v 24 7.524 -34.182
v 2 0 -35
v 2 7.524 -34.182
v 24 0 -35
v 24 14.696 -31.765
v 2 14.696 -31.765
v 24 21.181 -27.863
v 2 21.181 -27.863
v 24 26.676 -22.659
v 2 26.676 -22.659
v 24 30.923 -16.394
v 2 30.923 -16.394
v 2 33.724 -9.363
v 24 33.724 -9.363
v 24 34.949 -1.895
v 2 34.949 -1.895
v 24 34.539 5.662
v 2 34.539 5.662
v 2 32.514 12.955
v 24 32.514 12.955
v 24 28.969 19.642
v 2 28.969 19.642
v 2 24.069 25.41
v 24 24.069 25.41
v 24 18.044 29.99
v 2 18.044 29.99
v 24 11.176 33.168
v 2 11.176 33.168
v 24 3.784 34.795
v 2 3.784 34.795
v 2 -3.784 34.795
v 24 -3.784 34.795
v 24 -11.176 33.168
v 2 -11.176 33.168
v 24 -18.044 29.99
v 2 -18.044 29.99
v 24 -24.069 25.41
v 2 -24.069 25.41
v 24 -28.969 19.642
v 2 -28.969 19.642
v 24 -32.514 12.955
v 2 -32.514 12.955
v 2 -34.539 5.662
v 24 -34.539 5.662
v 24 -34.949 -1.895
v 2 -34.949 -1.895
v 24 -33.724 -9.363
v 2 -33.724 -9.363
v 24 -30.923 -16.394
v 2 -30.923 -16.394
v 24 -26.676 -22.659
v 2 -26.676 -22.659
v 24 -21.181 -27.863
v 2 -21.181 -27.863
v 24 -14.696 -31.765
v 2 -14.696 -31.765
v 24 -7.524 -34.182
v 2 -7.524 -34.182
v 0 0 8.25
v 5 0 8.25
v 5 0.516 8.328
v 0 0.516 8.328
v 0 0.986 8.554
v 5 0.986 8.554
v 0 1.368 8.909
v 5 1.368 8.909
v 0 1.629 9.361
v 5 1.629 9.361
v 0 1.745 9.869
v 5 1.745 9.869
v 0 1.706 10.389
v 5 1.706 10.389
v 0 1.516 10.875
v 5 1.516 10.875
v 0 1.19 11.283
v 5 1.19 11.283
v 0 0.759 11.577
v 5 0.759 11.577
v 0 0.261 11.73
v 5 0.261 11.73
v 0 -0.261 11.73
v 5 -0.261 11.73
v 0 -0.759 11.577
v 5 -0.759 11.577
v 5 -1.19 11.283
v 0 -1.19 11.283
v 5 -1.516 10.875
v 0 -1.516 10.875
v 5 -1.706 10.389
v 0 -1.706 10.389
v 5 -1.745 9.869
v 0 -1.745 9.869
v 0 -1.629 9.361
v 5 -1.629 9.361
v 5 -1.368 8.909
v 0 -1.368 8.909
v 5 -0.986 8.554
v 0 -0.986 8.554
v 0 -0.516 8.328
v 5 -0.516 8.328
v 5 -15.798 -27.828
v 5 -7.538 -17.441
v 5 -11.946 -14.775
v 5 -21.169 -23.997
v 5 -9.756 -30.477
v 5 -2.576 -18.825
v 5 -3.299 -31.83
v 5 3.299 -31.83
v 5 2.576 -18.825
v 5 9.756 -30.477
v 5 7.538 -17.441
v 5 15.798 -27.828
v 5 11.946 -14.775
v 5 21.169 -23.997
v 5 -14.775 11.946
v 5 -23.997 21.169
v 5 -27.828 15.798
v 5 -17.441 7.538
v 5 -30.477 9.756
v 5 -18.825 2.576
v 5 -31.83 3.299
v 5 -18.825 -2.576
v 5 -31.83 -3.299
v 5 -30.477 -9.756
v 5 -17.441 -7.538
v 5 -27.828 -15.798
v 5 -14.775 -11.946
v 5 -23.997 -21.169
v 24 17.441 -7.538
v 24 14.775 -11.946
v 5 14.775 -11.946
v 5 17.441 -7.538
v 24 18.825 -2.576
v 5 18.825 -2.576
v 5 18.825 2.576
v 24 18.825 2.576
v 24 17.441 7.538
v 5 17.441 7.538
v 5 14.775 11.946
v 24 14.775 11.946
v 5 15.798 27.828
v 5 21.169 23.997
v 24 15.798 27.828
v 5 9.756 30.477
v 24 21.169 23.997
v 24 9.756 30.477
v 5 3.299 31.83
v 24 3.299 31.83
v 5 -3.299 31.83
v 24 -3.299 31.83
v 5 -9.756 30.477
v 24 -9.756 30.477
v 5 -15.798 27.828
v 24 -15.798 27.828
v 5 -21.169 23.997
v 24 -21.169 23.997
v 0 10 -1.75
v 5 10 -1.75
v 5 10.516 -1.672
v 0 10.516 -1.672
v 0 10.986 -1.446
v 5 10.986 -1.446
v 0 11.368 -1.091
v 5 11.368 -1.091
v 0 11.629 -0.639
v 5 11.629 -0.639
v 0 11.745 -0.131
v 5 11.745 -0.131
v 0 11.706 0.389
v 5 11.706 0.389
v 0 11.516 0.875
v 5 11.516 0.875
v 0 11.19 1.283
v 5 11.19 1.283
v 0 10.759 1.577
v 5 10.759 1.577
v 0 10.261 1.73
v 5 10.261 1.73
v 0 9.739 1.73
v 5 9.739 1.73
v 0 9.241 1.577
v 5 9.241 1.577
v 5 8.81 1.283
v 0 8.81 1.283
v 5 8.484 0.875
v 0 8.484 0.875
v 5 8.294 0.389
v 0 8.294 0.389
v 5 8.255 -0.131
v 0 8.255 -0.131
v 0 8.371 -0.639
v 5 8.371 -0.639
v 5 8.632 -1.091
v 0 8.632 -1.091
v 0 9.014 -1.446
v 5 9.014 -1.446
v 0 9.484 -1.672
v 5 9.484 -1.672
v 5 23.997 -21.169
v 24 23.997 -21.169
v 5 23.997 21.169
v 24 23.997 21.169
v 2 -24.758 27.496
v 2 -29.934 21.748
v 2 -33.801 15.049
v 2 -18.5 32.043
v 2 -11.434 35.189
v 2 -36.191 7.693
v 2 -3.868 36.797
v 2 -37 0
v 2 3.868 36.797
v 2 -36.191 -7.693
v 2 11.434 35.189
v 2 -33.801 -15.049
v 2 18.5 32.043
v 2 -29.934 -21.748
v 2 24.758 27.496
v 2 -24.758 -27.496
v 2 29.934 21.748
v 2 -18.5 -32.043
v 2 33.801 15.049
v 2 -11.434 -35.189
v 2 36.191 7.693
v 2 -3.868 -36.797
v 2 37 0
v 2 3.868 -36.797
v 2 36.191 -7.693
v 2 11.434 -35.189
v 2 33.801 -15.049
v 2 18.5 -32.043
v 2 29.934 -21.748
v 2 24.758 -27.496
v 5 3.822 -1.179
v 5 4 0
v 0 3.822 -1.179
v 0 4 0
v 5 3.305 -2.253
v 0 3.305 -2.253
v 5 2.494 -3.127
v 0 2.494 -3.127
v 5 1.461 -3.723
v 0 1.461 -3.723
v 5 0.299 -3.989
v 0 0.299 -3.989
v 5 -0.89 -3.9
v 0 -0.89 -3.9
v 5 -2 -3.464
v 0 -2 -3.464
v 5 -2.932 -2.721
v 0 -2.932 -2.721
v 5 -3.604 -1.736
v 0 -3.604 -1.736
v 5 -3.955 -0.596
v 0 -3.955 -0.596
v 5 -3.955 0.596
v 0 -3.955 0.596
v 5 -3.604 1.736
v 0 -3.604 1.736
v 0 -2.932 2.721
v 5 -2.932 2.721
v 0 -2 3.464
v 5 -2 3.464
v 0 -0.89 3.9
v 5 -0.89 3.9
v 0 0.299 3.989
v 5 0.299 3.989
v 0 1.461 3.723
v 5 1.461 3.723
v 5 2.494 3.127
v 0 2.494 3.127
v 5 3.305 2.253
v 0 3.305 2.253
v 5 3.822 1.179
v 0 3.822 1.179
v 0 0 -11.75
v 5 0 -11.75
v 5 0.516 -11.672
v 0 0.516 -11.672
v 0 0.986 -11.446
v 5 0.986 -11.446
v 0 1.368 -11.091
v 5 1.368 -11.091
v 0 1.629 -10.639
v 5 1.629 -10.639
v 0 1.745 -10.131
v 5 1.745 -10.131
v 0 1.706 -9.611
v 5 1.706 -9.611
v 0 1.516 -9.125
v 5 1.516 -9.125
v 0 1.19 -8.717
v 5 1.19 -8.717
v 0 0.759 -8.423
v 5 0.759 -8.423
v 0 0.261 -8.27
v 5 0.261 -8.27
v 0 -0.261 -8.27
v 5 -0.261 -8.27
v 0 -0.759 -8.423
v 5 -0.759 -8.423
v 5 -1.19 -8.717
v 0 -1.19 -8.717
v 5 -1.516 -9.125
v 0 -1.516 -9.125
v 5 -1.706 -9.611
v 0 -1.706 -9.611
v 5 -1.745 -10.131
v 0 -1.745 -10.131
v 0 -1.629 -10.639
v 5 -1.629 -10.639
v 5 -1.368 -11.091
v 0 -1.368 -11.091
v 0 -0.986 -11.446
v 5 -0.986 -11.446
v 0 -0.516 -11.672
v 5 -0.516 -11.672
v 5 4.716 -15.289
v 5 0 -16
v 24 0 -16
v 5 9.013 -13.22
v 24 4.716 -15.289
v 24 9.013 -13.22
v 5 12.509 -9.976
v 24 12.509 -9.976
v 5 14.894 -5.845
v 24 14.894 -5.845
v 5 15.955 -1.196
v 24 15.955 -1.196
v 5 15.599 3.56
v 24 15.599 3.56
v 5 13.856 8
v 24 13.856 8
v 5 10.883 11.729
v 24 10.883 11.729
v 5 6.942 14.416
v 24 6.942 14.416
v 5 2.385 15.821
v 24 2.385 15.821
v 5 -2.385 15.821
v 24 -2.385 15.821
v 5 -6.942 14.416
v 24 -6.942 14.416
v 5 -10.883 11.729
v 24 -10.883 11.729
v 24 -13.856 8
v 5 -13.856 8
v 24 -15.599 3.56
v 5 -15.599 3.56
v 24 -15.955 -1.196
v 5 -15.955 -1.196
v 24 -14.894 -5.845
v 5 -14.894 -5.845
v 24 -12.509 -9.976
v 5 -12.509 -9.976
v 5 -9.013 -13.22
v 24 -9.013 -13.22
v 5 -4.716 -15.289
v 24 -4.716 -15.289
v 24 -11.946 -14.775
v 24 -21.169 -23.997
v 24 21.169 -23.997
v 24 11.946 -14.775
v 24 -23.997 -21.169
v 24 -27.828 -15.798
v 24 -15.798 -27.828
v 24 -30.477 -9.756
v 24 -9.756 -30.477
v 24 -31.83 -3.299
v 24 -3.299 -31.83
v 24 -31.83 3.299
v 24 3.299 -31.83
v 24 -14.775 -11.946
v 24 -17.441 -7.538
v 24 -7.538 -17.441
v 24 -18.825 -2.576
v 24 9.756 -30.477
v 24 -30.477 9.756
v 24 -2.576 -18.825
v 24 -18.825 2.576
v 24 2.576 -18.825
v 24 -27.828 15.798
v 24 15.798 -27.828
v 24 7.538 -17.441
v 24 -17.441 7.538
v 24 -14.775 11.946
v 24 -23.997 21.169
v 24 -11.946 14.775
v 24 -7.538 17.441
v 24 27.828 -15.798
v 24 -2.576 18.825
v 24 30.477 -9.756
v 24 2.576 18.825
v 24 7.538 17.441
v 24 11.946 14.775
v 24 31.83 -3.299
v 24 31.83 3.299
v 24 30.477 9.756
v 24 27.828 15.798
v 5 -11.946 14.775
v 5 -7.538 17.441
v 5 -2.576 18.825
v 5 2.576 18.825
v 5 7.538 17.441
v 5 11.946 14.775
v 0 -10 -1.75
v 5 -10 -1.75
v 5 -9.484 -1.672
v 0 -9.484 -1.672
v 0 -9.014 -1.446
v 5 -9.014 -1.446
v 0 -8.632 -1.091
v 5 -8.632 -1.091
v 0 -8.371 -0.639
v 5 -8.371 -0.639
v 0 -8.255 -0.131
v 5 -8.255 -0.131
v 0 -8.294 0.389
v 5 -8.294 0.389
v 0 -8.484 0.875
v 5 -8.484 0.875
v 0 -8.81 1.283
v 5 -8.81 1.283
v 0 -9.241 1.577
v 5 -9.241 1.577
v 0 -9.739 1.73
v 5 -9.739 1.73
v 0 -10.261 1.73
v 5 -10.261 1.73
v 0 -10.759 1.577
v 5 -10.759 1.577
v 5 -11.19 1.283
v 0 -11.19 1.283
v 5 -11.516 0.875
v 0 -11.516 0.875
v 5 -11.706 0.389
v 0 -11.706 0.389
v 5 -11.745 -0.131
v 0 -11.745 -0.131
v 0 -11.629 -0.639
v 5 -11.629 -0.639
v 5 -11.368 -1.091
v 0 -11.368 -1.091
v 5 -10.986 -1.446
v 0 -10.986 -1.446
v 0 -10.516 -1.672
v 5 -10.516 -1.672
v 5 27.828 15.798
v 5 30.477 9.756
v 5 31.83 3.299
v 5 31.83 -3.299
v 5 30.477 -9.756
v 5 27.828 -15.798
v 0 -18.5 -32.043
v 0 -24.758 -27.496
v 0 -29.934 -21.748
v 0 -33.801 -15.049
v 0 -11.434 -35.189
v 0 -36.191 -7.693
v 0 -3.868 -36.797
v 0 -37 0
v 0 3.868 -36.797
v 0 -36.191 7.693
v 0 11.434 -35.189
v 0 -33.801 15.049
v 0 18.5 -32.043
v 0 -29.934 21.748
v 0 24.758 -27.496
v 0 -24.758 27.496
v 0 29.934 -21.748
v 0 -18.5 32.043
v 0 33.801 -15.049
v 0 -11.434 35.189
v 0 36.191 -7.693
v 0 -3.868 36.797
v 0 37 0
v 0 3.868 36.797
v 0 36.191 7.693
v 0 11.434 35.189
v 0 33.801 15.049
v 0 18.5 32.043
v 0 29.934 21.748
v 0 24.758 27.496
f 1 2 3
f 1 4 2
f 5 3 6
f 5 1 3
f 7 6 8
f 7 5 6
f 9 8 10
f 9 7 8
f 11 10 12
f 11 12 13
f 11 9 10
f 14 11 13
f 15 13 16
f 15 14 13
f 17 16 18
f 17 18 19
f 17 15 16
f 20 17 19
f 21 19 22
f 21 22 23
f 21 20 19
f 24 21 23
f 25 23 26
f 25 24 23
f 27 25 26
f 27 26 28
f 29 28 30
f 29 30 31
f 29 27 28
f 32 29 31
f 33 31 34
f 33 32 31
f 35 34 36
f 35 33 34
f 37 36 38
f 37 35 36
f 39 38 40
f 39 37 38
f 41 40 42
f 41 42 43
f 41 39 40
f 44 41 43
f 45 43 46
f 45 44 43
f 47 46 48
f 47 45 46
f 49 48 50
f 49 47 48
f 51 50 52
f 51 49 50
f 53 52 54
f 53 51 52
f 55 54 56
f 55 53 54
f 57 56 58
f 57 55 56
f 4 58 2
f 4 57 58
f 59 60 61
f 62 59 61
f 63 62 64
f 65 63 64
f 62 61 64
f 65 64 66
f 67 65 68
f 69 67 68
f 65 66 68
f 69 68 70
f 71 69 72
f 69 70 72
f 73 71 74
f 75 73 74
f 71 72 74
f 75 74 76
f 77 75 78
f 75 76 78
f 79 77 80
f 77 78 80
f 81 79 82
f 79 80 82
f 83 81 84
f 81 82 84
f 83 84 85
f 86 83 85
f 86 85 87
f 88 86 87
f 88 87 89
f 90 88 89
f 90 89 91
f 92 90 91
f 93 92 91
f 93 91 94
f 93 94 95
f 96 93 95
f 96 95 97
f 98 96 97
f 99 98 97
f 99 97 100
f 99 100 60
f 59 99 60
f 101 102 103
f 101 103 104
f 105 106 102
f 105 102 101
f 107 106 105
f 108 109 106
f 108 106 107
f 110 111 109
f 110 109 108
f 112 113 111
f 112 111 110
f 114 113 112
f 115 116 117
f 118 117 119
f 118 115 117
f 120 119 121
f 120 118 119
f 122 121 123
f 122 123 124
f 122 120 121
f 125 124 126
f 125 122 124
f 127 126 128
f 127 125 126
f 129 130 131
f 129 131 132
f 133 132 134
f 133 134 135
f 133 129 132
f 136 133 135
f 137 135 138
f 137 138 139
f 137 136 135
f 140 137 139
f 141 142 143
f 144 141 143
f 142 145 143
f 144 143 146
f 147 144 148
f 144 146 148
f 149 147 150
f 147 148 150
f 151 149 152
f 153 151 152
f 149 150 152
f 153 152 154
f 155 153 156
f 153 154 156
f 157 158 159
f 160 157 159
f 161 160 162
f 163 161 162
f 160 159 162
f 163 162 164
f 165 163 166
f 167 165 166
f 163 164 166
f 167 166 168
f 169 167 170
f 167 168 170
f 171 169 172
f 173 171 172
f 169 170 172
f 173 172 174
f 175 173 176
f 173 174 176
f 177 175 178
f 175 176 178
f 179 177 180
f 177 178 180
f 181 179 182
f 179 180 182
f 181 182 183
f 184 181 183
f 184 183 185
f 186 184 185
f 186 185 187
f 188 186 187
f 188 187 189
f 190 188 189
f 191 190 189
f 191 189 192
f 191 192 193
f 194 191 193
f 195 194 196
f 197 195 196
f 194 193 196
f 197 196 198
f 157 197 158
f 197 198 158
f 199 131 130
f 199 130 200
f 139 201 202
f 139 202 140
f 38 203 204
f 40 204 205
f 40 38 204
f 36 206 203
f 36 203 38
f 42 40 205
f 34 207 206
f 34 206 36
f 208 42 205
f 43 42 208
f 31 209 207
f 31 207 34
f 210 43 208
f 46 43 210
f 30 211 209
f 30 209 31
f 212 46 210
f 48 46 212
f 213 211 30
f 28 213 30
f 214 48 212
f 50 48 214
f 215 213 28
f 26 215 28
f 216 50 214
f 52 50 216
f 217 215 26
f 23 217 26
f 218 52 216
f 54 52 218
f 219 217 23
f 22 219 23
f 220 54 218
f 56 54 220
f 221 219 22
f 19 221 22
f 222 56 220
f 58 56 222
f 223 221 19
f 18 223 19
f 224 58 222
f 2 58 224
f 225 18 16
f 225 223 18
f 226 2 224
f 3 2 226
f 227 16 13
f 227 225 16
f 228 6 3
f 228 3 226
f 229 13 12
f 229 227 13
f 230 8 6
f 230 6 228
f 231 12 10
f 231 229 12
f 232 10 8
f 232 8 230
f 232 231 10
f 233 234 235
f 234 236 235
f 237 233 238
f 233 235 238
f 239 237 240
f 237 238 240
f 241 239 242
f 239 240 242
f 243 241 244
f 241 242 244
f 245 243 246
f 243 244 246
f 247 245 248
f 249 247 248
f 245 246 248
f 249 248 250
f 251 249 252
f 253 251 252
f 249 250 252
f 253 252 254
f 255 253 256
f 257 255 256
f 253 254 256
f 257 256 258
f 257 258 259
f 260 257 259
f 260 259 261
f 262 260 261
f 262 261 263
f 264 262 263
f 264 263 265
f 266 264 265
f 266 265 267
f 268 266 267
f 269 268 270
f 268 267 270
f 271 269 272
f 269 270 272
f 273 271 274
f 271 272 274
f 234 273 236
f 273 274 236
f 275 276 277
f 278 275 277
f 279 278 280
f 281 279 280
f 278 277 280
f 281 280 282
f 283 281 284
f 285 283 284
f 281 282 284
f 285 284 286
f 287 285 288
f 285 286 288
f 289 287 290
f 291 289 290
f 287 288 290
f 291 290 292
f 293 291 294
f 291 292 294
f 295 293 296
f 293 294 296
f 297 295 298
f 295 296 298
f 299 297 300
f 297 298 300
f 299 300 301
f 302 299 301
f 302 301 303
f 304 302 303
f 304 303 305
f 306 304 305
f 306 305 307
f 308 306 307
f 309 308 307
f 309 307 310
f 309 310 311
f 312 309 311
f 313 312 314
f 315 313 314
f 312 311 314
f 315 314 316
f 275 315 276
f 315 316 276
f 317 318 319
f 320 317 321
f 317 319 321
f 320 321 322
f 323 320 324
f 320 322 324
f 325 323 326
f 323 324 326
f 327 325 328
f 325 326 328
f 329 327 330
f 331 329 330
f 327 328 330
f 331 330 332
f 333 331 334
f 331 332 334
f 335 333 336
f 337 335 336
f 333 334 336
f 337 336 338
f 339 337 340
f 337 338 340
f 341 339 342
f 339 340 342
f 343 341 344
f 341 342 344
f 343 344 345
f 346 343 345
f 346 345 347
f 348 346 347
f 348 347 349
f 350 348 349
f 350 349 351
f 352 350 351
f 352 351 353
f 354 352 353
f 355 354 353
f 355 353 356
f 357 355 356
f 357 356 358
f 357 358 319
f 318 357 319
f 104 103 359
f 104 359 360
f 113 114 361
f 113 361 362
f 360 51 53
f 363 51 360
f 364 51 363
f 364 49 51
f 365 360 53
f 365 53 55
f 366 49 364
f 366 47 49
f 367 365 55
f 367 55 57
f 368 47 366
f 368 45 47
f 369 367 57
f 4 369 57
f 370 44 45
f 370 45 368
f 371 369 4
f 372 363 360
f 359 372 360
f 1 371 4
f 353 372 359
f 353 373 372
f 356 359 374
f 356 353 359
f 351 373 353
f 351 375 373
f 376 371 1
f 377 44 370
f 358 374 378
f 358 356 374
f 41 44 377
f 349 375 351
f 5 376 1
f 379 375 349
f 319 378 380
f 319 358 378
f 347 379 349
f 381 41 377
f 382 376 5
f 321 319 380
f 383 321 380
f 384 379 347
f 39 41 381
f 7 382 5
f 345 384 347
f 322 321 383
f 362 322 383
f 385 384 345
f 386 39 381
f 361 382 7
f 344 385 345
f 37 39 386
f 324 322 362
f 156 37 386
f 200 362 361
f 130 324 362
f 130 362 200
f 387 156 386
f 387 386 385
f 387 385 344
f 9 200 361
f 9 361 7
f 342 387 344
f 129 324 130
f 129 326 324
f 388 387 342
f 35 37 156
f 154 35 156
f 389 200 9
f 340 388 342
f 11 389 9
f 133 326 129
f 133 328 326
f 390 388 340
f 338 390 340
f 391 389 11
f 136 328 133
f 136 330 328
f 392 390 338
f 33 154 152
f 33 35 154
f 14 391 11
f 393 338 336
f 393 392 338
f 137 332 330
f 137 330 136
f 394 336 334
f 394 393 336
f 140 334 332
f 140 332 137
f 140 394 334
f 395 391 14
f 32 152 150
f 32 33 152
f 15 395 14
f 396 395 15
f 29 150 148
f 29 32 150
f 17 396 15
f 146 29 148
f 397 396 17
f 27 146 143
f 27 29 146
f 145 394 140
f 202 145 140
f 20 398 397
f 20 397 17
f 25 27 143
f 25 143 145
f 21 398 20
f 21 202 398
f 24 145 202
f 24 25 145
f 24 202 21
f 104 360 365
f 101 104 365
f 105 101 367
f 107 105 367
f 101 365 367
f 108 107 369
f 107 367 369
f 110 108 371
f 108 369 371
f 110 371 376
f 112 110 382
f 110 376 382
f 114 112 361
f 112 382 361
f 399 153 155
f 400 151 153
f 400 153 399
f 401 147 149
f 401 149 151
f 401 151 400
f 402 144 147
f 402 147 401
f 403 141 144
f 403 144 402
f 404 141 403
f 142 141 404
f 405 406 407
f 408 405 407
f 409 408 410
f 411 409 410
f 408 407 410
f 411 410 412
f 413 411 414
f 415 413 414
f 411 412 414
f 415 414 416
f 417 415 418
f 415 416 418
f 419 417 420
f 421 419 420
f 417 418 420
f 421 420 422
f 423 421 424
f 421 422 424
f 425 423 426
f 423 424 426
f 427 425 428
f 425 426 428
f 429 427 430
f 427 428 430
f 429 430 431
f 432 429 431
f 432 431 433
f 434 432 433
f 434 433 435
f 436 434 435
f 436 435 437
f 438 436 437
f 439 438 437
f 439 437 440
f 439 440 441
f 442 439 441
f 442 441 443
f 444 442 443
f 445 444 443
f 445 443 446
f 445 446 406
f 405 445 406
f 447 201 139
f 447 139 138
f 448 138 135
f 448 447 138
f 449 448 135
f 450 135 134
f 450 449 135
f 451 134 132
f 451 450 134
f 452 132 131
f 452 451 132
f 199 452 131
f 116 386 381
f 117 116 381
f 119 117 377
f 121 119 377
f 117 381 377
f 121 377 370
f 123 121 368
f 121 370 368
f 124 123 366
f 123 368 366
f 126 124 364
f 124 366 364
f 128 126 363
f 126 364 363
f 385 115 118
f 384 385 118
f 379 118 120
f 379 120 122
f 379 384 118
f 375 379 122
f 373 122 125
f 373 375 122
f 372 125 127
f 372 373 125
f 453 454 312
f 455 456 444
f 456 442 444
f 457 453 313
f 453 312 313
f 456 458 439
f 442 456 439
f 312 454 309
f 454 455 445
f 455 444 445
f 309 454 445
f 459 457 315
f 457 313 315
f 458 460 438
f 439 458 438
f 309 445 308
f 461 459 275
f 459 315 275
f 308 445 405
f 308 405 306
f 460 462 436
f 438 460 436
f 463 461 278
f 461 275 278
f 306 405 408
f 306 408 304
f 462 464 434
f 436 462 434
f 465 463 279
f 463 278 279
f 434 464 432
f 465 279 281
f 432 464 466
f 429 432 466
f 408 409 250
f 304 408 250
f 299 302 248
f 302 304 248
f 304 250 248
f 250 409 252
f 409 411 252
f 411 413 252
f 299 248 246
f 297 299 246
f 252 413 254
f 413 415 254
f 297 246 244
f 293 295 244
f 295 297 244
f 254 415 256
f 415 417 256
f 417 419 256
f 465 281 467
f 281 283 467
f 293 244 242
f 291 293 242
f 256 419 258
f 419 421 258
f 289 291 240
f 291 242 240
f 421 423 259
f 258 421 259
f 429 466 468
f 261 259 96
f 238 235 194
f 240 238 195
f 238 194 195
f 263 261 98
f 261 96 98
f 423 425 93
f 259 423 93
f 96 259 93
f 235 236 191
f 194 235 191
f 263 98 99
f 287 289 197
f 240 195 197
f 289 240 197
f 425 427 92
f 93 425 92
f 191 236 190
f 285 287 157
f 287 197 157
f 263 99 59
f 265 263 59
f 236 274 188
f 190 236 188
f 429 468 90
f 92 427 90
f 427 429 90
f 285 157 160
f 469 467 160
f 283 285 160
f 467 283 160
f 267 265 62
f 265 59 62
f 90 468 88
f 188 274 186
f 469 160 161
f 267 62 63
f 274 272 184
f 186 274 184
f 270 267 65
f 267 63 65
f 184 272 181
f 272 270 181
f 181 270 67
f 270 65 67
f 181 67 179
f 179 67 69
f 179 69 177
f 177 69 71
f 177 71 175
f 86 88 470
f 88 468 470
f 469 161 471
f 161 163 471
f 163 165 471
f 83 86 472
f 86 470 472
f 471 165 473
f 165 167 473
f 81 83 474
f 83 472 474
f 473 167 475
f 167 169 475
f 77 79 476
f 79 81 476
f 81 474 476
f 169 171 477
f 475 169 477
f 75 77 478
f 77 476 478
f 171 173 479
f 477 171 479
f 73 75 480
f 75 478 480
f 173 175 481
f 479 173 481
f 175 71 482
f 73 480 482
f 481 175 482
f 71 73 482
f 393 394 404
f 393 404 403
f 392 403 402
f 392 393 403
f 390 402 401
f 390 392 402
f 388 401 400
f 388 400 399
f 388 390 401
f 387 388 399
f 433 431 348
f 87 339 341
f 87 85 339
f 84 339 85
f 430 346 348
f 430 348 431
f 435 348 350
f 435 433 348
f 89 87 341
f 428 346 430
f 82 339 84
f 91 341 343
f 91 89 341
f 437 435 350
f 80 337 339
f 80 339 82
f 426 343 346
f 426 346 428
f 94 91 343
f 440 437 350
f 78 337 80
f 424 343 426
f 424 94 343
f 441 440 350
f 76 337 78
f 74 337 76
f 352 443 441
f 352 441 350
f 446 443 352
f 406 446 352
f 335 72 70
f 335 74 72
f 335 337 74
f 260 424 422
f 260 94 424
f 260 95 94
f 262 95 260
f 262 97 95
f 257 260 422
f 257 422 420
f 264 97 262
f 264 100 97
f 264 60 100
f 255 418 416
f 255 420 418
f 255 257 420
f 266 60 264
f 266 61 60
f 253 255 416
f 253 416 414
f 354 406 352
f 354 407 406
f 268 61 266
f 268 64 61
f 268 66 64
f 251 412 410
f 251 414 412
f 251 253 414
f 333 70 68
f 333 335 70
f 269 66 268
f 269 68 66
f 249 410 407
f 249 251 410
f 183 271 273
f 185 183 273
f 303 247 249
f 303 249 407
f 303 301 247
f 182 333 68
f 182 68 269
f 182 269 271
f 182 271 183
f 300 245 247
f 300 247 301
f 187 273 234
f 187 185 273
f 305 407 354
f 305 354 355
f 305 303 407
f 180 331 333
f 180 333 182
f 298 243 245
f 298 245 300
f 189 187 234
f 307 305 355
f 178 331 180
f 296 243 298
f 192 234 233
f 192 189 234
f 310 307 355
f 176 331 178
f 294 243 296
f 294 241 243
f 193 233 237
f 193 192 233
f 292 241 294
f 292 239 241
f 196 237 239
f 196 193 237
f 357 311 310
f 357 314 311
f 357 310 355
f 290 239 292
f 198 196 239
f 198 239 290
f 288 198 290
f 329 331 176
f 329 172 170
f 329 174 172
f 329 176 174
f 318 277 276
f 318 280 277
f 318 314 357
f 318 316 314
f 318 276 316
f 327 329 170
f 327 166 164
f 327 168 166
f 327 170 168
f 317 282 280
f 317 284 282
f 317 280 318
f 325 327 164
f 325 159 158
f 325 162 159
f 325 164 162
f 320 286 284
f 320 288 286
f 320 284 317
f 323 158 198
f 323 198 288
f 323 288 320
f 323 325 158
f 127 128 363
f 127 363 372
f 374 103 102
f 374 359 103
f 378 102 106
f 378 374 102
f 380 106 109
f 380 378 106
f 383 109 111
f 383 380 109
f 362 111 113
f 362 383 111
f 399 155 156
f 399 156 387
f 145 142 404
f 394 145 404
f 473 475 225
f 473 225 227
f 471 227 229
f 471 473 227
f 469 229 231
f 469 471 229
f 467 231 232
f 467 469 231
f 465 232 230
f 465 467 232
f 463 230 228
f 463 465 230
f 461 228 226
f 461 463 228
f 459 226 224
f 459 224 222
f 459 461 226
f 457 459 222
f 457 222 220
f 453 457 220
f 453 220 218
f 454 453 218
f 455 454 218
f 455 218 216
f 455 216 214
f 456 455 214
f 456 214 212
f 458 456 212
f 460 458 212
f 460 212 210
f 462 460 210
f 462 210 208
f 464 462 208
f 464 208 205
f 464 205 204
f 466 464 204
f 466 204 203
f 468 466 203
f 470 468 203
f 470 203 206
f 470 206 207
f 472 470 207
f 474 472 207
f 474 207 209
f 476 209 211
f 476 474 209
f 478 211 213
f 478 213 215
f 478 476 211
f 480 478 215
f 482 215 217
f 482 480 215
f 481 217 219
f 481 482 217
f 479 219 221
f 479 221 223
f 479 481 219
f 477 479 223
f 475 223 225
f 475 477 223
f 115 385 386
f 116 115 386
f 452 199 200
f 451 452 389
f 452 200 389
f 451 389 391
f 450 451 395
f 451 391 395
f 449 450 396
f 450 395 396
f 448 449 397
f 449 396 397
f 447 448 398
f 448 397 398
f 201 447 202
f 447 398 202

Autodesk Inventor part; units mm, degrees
ref_plane "YZ Plane" through (0, 0, 0) normal (1, 0, 0) x (0, 1, 0)
ref_plane "XZ Plane" through (0, 0, 0) normal (0, 1, 0) x (-1, 0, 0)
ref_plane "XY Plane" through (0, 0, 0) normal (0, 0, 1) x (1, 0, 0)
sketch "스케치1" plane through (0, 0, 0) normal (1, 0, 0) x (0, 1, 0)
  circle A0 centre (0, 0) radius 37
  circle A1 centre (0, 0) radius 4
  dimension "d0" = 74
  dimension "d1" = 8
extrude "돌출1" add sketch "스케치1" along normal blind 24
sketch "스케치2" plane through (24, 0, 0) normal (1, 0, 0) x (0, 0, -1)
  circle A0 centre (0, 0) radius 16
  dimension "d4" = 32
extrude "돌출2" cut sketch "스케치2" against normal blind 19
sketch "스케치4" plane through (5, 0, 0) normal (1, 0, 0) x (0, 0, -1)
  circle A0 centre (0, 10) radius 1.75
  circle A1 centre (10, 0) radius 1.75
  circle A2 centre (0, -10) radius 1.75
  circle A3 centre (-10, 0) radius 1.75
  point P0 (0, 0)
  dimension "d8" = 3.5
  dimension "d9" = 3.5
  dimension "d10" = 3.5
  dimension "d11" = 3.5
extrude "돌출3" cut sketch "스케치4" against normal blind 19
sketch "스케치5" plane through (24, 0, 0) normal (1, 0, 0) x (0, 0, -1)
  circle A0 centre (0, 0) radius 19
  circle A1 centre (0, 0) radius 32
  line L0 (-19.4142, 16.5858) -> (-14.7746, 11.9462)
  line L1 (-23.9974, 21.169) -> (-19.4142, 16.5858)
  line L2 (-16.5858, 19.4142) -> (-11.9462, 14.7746)
  line L3 (-16.5858, 19.4142) -> (-21.169, 23.9974)
  line L4 (16.5858, 19.4142) -> (11.9462, 14.7746)
  line L5 (16.5858, 19.4142) -> (21.169, 23.9974)
  line L6 (19.4142, 16.5858) -> (23.9974, 21.169)
  line L7 (19.4142, 16.5858) -> (14.7746, 11.9462)
  line L8 (16.5858, -19.4142) -> (11.9462, -14.7746)
  line L9 (16.5858, -19.4142) -> (21.169, -23.9974)
  line L10 (19.4142, -16.5858) -> (14.7746, -11.9462)
  line L11 (19.4142, -16.5858) -> (23.9974, -21.169)
  line L12 (-19.4142, -16.5858) -> (-14.7746, -11.9462)
  line L13 (-19.4142, -16.5858) -> (-23.9974, -21.169)
  line L14 (-16.5858, -19.4142) -> (-11.9462, -14.7746)
  line L15 (-16.5858, -19.4142) -> (-21.169, -23.9974)
  line L16 (-14.7746, -11.9462) -> (-23.9974, -21.169)
  dimension "d18" = 4
extrude "돌출4" cut sketch "스케치5" against normal blind 19 contours A0 L7 L6 A1 L11 L10 | A0 L2 L3 A1 L5 L4 | L8 L9 A1 L15 L14 A0 | A0 L12 L13 A1 L1 L0
sketch "스케치6" plane through (24, 0, 0) normal (1, 0, 0) x (0, 0, -1)
  circle A0 centre (0, 0) radius 35
  circle A1 centre (0, 0) radius 37
  dimension "d22" = 70
extrude "돌출5" cut sketch "스케치6" against normal blind 22
properties part number "바퀴8PI" material "아세탈 수지, 검은색"
